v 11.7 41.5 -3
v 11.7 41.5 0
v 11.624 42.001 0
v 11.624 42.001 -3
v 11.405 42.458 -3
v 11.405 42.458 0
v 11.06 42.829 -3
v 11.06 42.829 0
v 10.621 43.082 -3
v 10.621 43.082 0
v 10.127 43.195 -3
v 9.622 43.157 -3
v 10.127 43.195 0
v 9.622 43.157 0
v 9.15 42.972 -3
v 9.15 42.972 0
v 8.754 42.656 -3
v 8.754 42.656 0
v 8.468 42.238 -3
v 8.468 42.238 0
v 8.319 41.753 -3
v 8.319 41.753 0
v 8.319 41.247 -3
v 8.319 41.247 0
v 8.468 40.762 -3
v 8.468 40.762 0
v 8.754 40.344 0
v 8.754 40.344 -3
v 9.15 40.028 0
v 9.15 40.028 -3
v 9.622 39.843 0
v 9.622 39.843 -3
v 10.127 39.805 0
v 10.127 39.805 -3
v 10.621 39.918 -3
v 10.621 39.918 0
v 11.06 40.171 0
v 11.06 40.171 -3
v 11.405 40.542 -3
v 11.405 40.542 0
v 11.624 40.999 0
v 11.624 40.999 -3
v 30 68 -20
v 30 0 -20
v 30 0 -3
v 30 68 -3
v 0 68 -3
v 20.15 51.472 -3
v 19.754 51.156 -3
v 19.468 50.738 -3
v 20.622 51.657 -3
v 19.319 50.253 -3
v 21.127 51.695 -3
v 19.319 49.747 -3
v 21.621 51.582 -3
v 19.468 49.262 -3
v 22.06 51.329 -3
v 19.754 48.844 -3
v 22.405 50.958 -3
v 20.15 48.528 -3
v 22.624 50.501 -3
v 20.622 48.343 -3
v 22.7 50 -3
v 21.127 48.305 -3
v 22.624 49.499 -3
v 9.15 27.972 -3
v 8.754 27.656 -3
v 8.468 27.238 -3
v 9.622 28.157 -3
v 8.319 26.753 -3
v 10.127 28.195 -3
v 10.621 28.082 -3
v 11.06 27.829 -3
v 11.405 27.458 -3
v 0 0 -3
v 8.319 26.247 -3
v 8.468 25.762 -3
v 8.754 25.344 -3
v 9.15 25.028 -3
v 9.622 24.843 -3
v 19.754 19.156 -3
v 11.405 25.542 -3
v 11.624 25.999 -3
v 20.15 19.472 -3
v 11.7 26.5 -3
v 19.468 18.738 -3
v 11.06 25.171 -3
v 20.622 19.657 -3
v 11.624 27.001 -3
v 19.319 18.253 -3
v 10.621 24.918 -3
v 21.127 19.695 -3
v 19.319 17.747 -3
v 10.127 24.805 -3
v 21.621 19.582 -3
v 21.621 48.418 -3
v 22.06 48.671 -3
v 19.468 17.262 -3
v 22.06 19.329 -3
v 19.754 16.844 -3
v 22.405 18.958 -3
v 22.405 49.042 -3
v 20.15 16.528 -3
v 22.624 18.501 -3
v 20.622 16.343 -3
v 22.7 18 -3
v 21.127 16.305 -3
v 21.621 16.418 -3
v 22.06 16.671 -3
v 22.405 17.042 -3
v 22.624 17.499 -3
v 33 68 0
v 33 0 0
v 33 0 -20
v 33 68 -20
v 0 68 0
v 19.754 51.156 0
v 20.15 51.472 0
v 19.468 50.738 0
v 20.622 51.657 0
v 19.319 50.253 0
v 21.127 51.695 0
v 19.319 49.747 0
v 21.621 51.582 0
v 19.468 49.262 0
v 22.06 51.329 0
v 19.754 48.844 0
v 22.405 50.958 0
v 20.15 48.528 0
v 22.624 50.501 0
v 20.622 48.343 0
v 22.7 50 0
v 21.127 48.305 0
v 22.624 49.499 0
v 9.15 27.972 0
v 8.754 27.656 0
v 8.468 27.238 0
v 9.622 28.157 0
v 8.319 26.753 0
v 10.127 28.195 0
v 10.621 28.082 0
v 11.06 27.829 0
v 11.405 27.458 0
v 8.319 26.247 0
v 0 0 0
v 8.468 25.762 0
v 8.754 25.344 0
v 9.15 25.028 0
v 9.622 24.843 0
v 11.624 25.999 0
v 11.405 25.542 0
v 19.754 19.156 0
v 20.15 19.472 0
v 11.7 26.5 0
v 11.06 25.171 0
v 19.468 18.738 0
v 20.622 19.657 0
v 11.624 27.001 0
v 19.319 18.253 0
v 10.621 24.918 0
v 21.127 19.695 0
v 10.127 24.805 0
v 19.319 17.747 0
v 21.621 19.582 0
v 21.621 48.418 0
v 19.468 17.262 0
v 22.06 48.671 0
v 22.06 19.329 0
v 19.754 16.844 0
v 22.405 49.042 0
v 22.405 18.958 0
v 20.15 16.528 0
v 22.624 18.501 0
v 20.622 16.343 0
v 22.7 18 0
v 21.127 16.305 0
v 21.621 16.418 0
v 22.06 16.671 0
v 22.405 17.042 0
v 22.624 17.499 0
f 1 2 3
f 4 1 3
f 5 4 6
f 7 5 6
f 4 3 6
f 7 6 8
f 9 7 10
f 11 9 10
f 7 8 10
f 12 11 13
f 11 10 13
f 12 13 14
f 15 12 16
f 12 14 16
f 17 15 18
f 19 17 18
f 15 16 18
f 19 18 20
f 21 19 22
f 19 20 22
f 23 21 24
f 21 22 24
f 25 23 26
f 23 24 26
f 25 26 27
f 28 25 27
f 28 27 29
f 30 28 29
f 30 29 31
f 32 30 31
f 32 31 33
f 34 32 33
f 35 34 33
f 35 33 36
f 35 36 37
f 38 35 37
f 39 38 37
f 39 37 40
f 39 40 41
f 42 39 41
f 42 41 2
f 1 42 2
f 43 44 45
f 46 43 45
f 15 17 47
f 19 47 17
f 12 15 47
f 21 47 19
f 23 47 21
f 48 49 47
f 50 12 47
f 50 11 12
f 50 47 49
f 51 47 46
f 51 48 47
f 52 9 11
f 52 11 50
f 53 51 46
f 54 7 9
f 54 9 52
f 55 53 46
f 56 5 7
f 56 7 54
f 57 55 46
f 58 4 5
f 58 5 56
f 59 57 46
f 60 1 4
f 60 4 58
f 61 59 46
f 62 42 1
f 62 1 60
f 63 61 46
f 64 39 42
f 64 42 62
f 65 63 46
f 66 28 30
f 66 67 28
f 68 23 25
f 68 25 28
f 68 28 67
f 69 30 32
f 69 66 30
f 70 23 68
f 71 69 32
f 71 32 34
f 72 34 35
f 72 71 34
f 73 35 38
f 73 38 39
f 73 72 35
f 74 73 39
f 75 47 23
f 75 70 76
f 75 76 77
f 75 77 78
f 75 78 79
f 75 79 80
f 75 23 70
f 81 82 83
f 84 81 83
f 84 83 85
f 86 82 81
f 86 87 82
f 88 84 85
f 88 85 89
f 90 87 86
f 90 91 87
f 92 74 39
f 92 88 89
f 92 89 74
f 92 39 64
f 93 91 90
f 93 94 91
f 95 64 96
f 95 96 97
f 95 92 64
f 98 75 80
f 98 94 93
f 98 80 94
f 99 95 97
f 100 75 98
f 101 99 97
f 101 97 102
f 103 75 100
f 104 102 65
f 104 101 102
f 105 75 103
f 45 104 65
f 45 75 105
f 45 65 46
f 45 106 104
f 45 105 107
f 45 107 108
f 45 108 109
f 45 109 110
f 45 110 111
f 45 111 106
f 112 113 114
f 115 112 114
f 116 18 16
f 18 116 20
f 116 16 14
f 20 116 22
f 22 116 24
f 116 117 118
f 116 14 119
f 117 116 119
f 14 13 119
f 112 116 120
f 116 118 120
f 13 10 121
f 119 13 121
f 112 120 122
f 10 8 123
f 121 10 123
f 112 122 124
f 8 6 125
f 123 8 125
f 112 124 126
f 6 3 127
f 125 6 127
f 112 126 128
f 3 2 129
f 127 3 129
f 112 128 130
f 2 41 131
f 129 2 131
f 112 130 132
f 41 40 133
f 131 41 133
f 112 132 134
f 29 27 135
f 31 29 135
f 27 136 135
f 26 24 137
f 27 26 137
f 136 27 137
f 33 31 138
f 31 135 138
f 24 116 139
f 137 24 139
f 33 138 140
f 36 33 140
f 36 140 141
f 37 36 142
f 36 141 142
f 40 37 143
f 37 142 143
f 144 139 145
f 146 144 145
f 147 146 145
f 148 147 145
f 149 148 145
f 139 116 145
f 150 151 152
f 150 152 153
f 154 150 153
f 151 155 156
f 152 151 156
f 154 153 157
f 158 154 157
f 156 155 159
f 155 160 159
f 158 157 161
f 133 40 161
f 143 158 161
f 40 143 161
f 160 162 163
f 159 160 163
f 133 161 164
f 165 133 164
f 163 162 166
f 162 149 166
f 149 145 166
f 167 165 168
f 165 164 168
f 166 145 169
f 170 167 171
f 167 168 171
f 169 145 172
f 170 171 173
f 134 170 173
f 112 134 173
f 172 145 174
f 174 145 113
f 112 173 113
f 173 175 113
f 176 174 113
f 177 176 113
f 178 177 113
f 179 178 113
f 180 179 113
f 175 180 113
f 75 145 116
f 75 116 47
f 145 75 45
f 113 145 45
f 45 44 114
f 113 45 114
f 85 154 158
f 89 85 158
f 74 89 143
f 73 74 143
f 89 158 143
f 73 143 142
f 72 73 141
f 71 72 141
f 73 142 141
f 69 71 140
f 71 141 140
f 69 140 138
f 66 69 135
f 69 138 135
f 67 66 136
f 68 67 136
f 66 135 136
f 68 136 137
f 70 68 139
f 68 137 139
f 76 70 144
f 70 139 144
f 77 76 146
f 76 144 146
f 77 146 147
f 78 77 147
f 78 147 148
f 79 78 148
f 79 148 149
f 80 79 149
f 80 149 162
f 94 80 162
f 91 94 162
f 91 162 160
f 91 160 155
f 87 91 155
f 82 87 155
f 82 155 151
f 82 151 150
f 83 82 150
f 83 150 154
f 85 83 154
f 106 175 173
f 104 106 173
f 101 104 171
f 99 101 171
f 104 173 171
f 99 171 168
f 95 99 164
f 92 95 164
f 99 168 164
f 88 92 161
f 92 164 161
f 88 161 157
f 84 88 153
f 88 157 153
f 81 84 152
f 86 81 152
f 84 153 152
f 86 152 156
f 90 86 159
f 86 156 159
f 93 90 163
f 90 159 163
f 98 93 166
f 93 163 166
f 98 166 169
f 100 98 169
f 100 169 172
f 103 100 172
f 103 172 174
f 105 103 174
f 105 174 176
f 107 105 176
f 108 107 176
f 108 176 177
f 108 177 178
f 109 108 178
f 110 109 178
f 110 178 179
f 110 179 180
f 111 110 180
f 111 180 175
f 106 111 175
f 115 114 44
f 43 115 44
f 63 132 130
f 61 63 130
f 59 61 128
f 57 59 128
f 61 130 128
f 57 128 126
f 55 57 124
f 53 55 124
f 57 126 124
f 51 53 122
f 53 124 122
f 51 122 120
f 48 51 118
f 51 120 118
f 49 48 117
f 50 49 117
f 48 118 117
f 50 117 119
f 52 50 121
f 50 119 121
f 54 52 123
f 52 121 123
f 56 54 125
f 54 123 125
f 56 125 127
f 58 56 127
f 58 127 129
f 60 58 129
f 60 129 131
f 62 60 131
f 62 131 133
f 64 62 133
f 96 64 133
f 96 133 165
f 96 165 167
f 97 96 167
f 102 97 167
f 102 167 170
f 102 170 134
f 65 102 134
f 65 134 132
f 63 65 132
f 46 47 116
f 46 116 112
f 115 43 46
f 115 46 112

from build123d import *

# Parameters (mm, degrees)
SKETCH_1_W          = 30
SKETCH_1_H          = 3
EXTRUDE_1_DEPTH     = 68
CUT_EXTRUDE_1_REACH = 80.186
SKETCH_2_R          = 1.7


with BuildPart() as part:
    # 草图1 → 凸台-拉伸1 (new body)
    with BuildSketch(Plane(origin=(0, 0, 0), x_dir=(1, 0, 0), z_dir=(0, 1, 0))):
        with Locations((15, 1.5)):
            Rectangle(SKETCH_1_W, SKETCH_1_H)
        Polygon((33, 20), (30, 20), (30, 3), (30, 0), (33, 0), align=None)
    extrude(amount=EXTRUDE_1_DEPTH)

    # 草图2 → 切除-拉伸1 (cut, up to next)
    with BuildSketch(Plane.XY, mode=Mode.PRIVATE) as cut_extrude_1_sk1:
        with Locations((21, 18)):
            Circle(SKETCH_2_R)
    cut_extrude_1_tool1 = extrude(cut_extrude_1_sk1.sketch, amount=-CUT_EXTRUDE_1_REACH, mode=Mode.PRIVATE) & part.part
    # 草图2 → 切除-拉伸1 (cut, up to next)
    with BuildSketch(Plane.XY, mode=Mode.PRIVATE) as cut_extrude_1_sk2:
        with Locations((21, 50)):
            Circle(SKETCH_2_R)
    cut_extrude_1_tool2 = extrude(cut_extrude_1_sk2.sketch, amount=-CUT_EXTRUDE_1_REACH, mode=Mode.PRIVATE) & part.part
    # 草图2 → 切除-拉伸1 (cut, up to next)
    with BuildSketch(Plane.XY, mode=Mode.PRIVATE) as cut_extrude_1_sk3:
        with Locations((10, 26.5)):
            Circle(SKETCH_2_R)
    cut_extrude_1_tool3 = extrude(cut_extrude_1_sk3.sketch, amount=-CUT_EXTRUDE_1_REACH, mode=Mode.PRIVATE) & part.part
    # 草图2 → 切除-拉伸1 (cut, up to next)
    with BuildSketch(Plane.XY, mode=Mode.PRIVATE) as cut_extrude_1_sk4:
        with Locations((10, 41.5)):
            Circle(SKETCH_2_R)
    cut_extrude_1_tool4 = extrude(cut_extrude_1_sk4.sketch, amount=-CUT_EXTRUDE_1_REACH, mode=Mode.PRIVATE) & part.part
    add(cut_extrude_1_tool1.solids().sort_by_distance((21, 18, 0))[0], mode=Mode.SUBTRACT)
    add(cut_extrude_1_tool2.solids().sort_by_distance((21, 50, 0))[0], mode=Mode.SUBTRACT)
    add(cut_extrude_1_tool3.solids().sort_by_distance((10, 26.5, 0))[0], mode=Mode.SUBTRACT)
    add(cut_extrude_1_tool4.solids().sort_by_distance((10, 41.5, 0))[0], mode=Mode.SUBTRACT)


solid = part.part
